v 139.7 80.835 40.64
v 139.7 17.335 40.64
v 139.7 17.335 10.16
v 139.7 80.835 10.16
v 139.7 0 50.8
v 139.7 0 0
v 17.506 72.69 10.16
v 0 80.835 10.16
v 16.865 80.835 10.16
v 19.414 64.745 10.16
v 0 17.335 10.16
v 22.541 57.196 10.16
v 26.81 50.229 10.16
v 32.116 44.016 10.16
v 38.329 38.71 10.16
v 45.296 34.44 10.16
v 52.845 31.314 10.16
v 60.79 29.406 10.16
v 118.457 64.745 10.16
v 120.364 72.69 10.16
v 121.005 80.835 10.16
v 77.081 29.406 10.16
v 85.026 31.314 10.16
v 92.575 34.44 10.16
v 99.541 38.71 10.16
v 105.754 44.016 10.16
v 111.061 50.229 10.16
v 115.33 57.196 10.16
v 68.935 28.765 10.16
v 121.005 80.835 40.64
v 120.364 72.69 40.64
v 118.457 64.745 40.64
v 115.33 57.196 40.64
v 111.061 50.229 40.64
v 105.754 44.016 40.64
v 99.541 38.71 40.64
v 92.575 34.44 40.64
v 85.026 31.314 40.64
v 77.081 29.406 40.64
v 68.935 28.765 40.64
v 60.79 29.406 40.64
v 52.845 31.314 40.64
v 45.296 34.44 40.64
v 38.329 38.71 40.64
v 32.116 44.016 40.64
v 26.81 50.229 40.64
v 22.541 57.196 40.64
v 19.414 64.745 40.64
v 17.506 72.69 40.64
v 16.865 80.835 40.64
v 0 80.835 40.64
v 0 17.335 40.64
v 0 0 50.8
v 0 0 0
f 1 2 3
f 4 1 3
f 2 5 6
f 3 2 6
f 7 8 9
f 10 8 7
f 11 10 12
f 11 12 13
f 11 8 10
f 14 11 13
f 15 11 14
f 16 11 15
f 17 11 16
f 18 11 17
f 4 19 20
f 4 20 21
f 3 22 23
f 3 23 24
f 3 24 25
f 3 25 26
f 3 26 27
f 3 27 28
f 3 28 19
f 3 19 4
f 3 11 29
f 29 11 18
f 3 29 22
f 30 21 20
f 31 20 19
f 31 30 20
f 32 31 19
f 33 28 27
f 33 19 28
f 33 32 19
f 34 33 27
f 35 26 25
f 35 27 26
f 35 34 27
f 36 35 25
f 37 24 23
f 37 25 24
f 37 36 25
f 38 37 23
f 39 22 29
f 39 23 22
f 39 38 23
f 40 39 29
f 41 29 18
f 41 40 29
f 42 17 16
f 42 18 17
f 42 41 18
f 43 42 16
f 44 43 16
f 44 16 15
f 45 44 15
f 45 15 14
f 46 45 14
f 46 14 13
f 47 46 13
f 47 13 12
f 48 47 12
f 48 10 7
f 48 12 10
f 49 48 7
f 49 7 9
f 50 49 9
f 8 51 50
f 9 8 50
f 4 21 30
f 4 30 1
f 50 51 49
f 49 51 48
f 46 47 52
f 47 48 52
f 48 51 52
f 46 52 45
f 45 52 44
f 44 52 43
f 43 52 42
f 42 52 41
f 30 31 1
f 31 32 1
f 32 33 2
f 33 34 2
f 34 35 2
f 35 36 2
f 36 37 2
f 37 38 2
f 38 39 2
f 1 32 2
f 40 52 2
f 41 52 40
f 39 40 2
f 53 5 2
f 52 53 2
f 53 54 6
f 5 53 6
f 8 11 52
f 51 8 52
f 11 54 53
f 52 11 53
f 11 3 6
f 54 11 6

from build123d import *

# Parameters (mm, degrees)
SKETCH1_W           = 139.7
SKETCH1_H           = 76.2
BOSS_EXTRUDE1_DEPTH = 50.8
CUT_EXTRUDE1_DEPTH  = 140.7
SKETCH3_W           = 139.7
SKETCH3_H           = 15.24
BOSS_EXTRUDE2_DEPTH = 63.5
CUT_EXTRUDE4_DEPTH  = 63.5


with BuildPart() as part:
    # Sketch1 → Boss-Extrude1 (new body)
    with BuildSketch(Plane.XY):
        with Locations((69.85, 38.1)):
            Rectangle(SKETCH1_W, SKETCH1_H)
    extrude(amount=BOSS_EXTRUDE1_DEPTH)

    # Sketch2 → Cut-Extrude1 (cut, through all)
    with BuildSketch(Plane(origin=(139.7, 0, 0), x_dir=(0, 0, -1), z_dir=(1, 0, 0))):
        Polygon((-50.8, 76.2), (-50.8, 0), (-40.64, 17.335178993), (-25.4, 17.335178993), (-10.16, 17.335178993), (0, 0), (0, 76.2), align=None)
    extrude(amount=-CUT_EXTRUDE1_DEPTH, mode=Mode.SUBTRACT)

    # Sketch3 → Boss-Extrude2 (add)
    with BuildSketch(Plane(origin=(0, 17.335178993, 0), x_dir=(1, 0, 0), z_dir=(0, 1, 0))):
        with Locations((69.85, -33.02)):
            Rectangle(SKETCH3_W, SKETCH3_H)
        with Locations((69.85, -17.78)):
            Rectangle(SKETCH3_W, SKETCH3_H)
    extrude(amount=BOSS_EXTRUDE2_DEPTH)

    # Sketch7 → Cut-Extrude4 (cut)
    with BuildSketch(Plane.XY.offset(40.64)):
        with BuildLine():
            Line((16.865330571, 80.835178993), (121.005330571, 80.835178993))
            ThreePointArc((121.005330571, 80.835178993), (68.935330571, 28.765178993), (16.865330571, 80.835178993))
        make_face()
    extrude(amount=-CUT_EXTRUDE4_DEPTH, mode=Mode.SUBTRACT)


solid = part.part
